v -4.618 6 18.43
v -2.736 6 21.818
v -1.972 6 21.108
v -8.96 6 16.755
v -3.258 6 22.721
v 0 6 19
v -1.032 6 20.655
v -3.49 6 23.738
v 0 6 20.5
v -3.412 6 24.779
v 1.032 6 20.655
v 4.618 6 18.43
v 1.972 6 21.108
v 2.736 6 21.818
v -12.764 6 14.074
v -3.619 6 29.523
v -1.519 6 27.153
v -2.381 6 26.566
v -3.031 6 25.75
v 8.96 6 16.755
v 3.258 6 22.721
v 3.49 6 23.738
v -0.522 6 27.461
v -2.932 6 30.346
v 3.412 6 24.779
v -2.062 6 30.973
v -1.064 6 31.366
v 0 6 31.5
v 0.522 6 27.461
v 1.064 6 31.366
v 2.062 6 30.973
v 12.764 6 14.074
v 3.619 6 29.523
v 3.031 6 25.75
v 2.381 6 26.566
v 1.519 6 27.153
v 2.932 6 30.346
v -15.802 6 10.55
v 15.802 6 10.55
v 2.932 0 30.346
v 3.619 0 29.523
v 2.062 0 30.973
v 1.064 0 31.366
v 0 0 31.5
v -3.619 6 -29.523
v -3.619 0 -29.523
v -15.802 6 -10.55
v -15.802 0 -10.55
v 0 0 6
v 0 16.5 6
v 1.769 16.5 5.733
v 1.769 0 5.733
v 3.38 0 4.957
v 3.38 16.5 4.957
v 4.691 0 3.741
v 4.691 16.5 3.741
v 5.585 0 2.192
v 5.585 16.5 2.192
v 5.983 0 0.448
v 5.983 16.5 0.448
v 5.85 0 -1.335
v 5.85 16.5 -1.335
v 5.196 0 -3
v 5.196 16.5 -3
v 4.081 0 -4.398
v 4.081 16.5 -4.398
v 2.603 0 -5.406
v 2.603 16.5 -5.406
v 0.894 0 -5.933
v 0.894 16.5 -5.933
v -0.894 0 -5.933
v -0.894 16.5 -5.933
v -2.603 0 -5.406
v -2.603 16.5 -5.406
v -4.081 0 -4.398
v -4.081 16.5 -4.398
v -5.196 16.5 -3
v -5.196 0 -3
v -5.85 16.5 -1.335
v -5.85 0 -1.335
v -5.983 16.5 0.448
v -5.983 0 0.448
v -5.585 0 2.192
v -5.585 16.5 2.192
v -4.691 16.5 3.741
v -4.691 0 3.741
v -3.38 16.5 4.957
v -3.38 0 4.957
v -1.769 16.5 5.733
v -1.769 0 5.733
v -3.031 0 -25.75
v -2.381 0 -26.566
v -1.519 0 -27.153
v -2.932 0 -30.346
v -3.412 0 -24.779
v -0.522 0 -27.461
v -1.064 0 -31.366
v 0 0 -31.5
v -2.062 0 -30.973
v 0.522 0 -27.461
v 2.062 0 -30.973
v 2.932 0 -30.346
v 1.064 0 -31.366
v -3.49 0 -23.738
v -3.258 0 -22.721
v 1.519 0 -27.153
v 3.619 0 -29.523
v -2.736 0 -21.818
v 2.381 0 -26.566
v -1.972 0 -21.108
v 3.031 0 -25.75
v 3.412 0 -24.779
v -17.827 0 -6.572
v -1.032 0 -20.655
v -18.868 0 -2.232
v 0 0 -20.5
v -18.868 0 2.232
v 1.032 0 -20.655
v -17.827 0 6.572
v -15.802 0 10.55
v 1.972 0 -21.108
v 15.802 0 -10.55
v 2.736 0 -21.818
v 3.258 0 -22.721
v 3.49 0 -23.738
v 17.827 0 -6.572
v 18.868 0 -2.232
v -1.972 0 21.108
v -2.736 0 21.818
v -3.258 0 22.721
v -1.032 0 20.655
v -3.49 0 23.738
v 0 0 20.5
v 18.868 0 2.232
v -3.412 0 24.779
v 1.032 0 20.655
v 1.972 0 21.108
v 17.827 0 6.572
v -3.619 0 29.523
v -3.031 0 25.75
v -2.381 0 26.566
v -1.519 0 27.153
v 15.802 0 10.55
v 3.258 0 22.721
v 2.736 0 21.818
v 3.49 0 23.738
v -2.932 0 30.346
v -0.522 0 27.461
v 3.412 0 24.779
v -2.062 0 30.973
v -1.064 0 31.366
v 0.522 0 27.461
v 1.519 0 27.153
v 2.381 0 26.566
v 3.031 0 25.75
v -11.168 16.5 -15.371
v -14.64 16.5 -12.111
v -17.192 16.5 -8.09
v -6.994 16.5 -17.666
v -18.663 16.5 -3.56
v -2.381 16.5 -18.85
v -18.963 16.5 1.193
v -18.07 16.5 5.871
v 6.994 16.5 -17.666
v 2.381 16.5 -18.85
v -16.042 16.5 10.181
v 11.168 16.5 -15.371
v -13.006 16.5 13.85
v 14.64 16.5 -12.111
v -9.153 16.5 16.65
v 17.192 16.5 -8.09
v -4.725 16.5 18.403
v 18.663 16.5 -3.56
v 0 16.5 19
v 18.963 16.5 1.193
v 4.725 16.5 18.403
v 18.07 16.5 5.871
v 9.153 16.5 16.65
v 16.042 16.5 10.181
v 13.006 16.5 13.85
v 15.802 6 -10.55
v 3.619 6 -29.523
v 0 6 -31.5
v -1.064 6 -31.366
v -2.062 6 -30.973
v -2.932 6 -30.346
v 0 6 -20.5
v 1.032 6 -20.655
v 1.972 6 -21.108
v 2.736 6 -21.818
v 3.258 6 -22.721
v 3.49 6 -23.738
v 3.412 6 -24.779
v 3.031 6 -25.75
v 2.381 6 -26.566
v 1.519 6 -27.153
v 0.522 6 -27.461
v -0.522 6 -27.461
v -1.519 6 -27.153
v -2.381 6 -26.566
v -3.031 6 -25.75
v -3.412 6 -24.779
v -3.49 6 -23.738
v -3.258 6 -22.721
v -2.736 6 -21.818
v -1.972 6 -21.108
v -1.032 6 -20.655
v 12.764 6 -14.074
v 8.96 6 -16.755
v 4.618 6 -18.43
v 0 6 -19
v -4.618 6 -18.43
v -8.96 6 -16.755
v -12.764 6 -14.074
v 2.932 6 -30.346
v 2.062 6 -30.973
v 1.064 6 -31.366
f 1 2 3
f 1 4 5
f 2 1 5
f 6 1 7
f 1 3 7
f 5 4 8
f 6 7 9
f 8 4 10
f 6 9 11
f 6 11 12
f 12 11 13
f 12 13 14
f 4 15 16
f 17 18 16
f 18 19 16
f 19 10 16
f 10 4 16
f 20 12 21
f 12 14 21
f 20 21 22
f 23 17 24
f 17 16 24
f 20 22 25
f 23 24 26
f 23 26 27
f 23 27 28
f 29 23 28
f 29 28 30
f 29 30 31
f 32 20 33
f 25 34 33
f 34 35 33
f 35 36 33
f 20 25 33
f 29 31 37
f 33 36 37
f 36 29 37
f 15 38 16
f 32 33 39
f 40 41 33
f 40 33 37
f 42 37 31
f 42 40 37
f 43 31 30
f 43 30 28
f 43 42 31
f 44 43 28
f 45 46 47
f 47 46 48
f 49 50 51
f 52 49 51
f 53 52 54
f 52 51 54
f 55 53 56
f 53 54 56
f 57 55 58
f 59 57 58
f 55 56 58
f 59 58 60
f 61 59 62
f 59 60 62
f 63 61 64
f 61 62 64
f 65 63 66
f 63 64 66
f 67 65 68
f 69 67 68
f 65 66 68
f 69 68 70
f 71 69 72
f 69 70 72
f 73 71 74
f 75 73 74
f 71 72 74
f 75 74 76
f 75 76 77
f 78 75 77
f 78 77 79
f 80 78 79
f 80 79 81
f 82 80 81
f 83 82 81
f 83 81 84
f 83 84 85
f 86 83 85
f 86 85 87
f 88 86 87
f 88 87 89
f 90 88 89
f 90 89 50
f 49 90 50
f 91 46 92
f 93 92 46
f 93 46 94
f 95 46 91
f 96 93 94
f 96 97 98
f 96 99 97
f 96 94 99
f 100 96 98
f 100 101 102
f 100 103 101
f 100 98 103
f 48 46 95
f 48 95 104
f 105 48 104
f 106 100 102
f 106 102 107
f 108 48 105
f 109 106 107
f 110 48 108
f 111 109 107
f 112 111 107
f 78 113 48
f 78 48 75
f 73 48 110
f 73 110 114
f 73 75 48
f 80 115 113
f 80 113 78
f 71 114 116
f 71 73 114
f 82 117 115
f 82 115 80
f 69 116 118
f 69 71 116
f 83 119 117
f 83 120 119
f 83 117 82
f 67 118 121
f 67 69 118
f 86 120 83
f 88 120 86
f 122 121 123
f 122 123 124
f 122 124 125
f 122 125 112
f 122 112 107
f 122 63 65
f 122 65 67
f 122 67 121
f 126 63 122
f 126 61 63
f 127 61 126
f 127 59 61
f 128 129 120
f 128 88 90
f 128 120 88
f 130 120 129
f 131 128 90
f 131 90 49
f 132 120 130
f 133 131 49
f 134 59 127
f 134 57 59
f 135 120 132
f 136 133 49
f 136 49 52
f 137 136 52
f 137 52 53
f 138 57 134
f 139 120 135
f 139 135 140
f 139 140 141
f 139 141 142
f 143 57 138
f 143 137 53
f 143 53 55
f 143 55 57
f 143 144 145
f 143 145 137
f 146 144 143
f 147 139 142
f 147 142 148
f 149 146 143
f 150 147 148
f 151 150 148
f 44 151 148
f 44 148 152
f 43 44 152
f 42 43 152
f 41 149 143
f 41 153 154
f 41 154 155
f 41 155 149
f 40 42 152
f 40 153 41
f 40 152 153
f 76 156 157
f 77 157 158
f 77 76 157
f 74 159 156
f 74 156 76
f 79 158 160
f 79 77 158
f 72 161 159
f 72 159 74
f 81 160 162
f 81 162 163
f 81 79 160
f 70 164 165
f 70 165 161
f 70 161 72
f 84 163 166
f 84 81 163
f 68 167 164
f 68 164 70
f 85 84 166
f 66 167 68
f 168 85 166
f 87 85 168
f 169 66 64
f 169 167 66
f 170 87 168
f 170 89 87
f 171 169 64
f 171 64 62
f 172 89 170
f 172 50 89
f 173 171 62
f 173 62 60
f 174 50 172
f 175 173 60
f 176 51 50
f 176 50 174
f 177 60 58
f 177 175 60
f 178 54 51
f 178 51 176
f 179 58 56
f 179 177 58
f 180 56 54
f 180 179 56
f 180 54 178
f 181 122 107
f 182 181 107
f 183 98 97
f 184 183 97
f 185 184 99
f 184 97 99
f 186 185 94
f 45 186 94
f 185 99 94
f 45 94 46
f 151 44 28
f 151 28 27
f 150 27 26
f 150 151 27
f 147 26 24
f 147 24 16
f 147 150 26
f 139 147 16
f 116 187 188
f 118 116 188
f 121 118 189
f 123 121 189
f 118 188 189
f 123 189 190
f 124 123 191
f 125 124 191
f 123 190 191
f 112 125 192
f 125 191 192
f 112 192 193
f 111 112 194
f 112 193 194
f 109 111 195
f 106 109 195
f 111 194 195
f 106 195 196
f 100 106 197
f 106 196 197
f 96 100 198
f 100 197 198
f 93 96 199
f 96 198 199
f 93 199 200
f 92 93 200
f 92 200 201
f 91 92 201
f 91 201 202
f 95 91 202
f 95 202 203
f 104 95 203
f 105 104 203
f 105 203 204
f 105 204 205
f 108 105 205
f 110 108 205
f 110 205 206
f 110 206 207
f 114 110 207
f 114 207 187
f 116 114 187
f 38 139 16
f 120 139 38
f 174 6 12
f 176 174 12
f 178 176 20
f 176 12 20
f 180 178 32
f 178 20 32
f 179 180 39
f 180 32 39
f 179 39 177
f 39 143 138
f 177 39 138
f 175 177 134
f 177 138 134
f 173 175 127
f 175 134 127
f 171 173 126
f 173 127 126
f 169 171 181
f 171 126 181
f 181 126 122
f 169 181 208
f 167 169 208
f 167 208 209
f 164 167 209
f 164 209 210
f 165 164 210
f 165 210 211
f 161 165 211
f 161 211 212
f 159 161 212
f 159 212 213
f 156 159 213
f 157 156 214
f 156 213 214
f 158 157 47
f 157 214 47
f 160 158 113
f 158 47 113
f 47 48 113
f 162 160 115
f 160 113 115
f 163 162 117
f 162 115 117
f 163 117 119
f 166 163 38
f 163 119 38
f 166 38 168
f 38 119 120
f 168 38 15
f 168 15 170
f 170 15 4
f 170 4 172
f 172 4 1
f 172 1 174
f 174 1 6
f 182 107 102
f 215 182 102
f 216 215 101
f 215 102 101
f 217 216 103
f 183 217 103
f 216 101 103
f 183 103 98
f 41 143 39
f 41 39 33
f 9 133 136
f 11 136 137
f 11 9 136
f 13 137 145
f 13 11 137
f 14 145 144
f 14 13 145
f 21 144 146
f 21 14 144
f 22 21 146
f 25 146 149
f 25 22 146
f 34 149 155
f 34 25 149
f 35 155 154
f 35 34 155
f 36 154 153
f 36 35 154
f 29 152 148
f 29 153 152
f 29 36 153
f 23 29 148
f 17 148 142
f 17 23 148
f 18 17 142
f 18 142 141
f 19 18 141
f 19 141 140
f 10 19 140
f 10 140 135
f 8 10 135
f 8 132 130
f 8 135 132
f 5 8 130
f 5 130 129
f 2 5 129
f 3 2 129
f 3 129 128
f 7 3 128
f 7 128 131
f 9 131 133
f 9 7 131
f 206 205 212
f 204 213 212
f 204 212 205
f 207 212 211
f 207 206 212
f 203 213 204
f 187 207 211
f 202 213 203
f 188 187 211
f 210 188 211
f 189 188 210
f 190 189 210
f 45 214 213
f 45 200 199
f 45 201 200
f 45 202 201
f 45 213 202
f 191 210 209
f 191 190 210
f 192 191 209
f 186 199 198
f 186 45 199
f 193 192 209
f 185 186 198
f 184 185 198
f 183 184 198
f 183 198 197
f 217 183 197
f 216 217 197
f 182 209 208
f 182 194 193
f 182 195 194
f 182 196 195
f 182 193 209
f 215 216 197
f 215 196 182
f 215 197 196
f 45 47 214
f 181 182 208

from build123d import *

# Parameters (mm, degrees)
SKETCH1_R           = 19
BOSS_EXTRUDE1_DEPTH = 16.5
BOSS_EXTRUDE2_DEPTH = 6
SKETCH3_R           = 6
CUT_EXTRUDE1_DEPTH  = 41.317490001
SKETCH4_R           = 3.5
CUT_EXTRUDE2_DEPTH  = 39.255718527


with BuildPart() as part:
    # Sketch1 → Boss-Extrude1 (new body)
    with BuildSketch(Plane(origin=(0, 0, 0), x_dir=(1, 0, 0), z_dir=(0, 1, 0))):
        with Locations(Location((0, 0, 0), (0, 0, 270))):
            Circle(SKETCH1_R)
    extrude(amount=BOSS_EXTRUDE1_DEPTH)

    # Sketch2 → Boss-Extrude2 (add)
    with BuildSketch(Plane(origin=(0, 0, 0), x_dir=(1, 0, 0), z_dir=(0, 1, 0))):
        with BuildLine():
            Line((0, 10.549840688), (0, 22.89723562))
            ThreePointArc((0, 22.89723562), (-3.774822907, 25.136434317), (-3.61947725, 29.522681746))
            Line((-3.61947725, 29.522681746), (-15.801925878, 10.549840688))
            Line((-15.801925878, 10.549840688), (0, 10.549840688))
        make_face()
        with BuildLine():
            ThreePointArc((4.30138219, 27.19861781), (3.041536515, 24.157081295), (0, 22.89723562))
            Line((0, 22.89723562), (0, 10.549840688))
            Line((0, 10.549840688), (15.801925878, 10.549840688))
            Line((15.801925878, 10.549840688), (3.61947725, 29.522681746))
            ThreePointArc((3.61947725, 29.522681746), (4.127386808, 28.409636753), (4.30138219, 27.19861781))
        make_face()
        with BuildLine():
            ThreePointArc((3.61947725, 29.522681746), (2.062183493, 30.973440718), (0, 31.5))
            Line((0, 31.5), (0, 22.89723562))
            ThreePointArc((0, 22.89723562), (3.041536515, 24.157081295), (4.30138219, 27.19861781))
            ThreePointArc((4.30138219, 27.19861781), (4.127386808, 28.409636753), (3.61947725, 29.522681746))
        make_face()
        with BuildLine():
            Line((0, 22.89723562), (0, 31.5))
            ThreePointArc((0, 31.5), (-2.062183493, 30.973440718), (-3.61947725, 29.522681746))
            ThreePointArc((-3.61947725, 29.522681746), (-3.774822907, 25.136434317), (0, 22.89723562))
        make_face()
    boss_extrude2 = extrude(amount=BOSS_EXTRUDE2_DEPTH)

    # Sketch3 → Cut-Extrude1 (cut, through all)
    with BuildSketch(Plane(origin=(0, 16.5, 0), x_dir=(1, 0, 0), z_dir=(0, 1, 0))):
        with Locations(Location((0, 0, 0), (0, 0, 270))):
            Circle(SKETCH3_R)
    extrude(amount=-CUT_EXTRUDE1_DEPTH, mode=Mode.SUBTRACT)

    # Sketch4 → Cut-Extrude2 (cut, through all)
    with BuildSketch(Plane(origin=(0, 6, 0), x_dir=(1, 0, 0), z_dir=(0, 1, 0))):
        with Locations(Location((0, 24, 0), (0, 0, 270))):
            Circle(SKETCH4_R)
    cut_extrude2 = extrude(amount=-CUT_EXTRUDE2_DEPTH, mode=Mode.SUBTRACT)

    # Mirror1: Boss-Extrude2, Cut-Extrude2 across plane
    add(boss_extrude2.mirror(Plane.XY))
    add(cut_extrude2.mirror(Plane.XY), mode=Mode.SUBTRACT)


solid = part.part
